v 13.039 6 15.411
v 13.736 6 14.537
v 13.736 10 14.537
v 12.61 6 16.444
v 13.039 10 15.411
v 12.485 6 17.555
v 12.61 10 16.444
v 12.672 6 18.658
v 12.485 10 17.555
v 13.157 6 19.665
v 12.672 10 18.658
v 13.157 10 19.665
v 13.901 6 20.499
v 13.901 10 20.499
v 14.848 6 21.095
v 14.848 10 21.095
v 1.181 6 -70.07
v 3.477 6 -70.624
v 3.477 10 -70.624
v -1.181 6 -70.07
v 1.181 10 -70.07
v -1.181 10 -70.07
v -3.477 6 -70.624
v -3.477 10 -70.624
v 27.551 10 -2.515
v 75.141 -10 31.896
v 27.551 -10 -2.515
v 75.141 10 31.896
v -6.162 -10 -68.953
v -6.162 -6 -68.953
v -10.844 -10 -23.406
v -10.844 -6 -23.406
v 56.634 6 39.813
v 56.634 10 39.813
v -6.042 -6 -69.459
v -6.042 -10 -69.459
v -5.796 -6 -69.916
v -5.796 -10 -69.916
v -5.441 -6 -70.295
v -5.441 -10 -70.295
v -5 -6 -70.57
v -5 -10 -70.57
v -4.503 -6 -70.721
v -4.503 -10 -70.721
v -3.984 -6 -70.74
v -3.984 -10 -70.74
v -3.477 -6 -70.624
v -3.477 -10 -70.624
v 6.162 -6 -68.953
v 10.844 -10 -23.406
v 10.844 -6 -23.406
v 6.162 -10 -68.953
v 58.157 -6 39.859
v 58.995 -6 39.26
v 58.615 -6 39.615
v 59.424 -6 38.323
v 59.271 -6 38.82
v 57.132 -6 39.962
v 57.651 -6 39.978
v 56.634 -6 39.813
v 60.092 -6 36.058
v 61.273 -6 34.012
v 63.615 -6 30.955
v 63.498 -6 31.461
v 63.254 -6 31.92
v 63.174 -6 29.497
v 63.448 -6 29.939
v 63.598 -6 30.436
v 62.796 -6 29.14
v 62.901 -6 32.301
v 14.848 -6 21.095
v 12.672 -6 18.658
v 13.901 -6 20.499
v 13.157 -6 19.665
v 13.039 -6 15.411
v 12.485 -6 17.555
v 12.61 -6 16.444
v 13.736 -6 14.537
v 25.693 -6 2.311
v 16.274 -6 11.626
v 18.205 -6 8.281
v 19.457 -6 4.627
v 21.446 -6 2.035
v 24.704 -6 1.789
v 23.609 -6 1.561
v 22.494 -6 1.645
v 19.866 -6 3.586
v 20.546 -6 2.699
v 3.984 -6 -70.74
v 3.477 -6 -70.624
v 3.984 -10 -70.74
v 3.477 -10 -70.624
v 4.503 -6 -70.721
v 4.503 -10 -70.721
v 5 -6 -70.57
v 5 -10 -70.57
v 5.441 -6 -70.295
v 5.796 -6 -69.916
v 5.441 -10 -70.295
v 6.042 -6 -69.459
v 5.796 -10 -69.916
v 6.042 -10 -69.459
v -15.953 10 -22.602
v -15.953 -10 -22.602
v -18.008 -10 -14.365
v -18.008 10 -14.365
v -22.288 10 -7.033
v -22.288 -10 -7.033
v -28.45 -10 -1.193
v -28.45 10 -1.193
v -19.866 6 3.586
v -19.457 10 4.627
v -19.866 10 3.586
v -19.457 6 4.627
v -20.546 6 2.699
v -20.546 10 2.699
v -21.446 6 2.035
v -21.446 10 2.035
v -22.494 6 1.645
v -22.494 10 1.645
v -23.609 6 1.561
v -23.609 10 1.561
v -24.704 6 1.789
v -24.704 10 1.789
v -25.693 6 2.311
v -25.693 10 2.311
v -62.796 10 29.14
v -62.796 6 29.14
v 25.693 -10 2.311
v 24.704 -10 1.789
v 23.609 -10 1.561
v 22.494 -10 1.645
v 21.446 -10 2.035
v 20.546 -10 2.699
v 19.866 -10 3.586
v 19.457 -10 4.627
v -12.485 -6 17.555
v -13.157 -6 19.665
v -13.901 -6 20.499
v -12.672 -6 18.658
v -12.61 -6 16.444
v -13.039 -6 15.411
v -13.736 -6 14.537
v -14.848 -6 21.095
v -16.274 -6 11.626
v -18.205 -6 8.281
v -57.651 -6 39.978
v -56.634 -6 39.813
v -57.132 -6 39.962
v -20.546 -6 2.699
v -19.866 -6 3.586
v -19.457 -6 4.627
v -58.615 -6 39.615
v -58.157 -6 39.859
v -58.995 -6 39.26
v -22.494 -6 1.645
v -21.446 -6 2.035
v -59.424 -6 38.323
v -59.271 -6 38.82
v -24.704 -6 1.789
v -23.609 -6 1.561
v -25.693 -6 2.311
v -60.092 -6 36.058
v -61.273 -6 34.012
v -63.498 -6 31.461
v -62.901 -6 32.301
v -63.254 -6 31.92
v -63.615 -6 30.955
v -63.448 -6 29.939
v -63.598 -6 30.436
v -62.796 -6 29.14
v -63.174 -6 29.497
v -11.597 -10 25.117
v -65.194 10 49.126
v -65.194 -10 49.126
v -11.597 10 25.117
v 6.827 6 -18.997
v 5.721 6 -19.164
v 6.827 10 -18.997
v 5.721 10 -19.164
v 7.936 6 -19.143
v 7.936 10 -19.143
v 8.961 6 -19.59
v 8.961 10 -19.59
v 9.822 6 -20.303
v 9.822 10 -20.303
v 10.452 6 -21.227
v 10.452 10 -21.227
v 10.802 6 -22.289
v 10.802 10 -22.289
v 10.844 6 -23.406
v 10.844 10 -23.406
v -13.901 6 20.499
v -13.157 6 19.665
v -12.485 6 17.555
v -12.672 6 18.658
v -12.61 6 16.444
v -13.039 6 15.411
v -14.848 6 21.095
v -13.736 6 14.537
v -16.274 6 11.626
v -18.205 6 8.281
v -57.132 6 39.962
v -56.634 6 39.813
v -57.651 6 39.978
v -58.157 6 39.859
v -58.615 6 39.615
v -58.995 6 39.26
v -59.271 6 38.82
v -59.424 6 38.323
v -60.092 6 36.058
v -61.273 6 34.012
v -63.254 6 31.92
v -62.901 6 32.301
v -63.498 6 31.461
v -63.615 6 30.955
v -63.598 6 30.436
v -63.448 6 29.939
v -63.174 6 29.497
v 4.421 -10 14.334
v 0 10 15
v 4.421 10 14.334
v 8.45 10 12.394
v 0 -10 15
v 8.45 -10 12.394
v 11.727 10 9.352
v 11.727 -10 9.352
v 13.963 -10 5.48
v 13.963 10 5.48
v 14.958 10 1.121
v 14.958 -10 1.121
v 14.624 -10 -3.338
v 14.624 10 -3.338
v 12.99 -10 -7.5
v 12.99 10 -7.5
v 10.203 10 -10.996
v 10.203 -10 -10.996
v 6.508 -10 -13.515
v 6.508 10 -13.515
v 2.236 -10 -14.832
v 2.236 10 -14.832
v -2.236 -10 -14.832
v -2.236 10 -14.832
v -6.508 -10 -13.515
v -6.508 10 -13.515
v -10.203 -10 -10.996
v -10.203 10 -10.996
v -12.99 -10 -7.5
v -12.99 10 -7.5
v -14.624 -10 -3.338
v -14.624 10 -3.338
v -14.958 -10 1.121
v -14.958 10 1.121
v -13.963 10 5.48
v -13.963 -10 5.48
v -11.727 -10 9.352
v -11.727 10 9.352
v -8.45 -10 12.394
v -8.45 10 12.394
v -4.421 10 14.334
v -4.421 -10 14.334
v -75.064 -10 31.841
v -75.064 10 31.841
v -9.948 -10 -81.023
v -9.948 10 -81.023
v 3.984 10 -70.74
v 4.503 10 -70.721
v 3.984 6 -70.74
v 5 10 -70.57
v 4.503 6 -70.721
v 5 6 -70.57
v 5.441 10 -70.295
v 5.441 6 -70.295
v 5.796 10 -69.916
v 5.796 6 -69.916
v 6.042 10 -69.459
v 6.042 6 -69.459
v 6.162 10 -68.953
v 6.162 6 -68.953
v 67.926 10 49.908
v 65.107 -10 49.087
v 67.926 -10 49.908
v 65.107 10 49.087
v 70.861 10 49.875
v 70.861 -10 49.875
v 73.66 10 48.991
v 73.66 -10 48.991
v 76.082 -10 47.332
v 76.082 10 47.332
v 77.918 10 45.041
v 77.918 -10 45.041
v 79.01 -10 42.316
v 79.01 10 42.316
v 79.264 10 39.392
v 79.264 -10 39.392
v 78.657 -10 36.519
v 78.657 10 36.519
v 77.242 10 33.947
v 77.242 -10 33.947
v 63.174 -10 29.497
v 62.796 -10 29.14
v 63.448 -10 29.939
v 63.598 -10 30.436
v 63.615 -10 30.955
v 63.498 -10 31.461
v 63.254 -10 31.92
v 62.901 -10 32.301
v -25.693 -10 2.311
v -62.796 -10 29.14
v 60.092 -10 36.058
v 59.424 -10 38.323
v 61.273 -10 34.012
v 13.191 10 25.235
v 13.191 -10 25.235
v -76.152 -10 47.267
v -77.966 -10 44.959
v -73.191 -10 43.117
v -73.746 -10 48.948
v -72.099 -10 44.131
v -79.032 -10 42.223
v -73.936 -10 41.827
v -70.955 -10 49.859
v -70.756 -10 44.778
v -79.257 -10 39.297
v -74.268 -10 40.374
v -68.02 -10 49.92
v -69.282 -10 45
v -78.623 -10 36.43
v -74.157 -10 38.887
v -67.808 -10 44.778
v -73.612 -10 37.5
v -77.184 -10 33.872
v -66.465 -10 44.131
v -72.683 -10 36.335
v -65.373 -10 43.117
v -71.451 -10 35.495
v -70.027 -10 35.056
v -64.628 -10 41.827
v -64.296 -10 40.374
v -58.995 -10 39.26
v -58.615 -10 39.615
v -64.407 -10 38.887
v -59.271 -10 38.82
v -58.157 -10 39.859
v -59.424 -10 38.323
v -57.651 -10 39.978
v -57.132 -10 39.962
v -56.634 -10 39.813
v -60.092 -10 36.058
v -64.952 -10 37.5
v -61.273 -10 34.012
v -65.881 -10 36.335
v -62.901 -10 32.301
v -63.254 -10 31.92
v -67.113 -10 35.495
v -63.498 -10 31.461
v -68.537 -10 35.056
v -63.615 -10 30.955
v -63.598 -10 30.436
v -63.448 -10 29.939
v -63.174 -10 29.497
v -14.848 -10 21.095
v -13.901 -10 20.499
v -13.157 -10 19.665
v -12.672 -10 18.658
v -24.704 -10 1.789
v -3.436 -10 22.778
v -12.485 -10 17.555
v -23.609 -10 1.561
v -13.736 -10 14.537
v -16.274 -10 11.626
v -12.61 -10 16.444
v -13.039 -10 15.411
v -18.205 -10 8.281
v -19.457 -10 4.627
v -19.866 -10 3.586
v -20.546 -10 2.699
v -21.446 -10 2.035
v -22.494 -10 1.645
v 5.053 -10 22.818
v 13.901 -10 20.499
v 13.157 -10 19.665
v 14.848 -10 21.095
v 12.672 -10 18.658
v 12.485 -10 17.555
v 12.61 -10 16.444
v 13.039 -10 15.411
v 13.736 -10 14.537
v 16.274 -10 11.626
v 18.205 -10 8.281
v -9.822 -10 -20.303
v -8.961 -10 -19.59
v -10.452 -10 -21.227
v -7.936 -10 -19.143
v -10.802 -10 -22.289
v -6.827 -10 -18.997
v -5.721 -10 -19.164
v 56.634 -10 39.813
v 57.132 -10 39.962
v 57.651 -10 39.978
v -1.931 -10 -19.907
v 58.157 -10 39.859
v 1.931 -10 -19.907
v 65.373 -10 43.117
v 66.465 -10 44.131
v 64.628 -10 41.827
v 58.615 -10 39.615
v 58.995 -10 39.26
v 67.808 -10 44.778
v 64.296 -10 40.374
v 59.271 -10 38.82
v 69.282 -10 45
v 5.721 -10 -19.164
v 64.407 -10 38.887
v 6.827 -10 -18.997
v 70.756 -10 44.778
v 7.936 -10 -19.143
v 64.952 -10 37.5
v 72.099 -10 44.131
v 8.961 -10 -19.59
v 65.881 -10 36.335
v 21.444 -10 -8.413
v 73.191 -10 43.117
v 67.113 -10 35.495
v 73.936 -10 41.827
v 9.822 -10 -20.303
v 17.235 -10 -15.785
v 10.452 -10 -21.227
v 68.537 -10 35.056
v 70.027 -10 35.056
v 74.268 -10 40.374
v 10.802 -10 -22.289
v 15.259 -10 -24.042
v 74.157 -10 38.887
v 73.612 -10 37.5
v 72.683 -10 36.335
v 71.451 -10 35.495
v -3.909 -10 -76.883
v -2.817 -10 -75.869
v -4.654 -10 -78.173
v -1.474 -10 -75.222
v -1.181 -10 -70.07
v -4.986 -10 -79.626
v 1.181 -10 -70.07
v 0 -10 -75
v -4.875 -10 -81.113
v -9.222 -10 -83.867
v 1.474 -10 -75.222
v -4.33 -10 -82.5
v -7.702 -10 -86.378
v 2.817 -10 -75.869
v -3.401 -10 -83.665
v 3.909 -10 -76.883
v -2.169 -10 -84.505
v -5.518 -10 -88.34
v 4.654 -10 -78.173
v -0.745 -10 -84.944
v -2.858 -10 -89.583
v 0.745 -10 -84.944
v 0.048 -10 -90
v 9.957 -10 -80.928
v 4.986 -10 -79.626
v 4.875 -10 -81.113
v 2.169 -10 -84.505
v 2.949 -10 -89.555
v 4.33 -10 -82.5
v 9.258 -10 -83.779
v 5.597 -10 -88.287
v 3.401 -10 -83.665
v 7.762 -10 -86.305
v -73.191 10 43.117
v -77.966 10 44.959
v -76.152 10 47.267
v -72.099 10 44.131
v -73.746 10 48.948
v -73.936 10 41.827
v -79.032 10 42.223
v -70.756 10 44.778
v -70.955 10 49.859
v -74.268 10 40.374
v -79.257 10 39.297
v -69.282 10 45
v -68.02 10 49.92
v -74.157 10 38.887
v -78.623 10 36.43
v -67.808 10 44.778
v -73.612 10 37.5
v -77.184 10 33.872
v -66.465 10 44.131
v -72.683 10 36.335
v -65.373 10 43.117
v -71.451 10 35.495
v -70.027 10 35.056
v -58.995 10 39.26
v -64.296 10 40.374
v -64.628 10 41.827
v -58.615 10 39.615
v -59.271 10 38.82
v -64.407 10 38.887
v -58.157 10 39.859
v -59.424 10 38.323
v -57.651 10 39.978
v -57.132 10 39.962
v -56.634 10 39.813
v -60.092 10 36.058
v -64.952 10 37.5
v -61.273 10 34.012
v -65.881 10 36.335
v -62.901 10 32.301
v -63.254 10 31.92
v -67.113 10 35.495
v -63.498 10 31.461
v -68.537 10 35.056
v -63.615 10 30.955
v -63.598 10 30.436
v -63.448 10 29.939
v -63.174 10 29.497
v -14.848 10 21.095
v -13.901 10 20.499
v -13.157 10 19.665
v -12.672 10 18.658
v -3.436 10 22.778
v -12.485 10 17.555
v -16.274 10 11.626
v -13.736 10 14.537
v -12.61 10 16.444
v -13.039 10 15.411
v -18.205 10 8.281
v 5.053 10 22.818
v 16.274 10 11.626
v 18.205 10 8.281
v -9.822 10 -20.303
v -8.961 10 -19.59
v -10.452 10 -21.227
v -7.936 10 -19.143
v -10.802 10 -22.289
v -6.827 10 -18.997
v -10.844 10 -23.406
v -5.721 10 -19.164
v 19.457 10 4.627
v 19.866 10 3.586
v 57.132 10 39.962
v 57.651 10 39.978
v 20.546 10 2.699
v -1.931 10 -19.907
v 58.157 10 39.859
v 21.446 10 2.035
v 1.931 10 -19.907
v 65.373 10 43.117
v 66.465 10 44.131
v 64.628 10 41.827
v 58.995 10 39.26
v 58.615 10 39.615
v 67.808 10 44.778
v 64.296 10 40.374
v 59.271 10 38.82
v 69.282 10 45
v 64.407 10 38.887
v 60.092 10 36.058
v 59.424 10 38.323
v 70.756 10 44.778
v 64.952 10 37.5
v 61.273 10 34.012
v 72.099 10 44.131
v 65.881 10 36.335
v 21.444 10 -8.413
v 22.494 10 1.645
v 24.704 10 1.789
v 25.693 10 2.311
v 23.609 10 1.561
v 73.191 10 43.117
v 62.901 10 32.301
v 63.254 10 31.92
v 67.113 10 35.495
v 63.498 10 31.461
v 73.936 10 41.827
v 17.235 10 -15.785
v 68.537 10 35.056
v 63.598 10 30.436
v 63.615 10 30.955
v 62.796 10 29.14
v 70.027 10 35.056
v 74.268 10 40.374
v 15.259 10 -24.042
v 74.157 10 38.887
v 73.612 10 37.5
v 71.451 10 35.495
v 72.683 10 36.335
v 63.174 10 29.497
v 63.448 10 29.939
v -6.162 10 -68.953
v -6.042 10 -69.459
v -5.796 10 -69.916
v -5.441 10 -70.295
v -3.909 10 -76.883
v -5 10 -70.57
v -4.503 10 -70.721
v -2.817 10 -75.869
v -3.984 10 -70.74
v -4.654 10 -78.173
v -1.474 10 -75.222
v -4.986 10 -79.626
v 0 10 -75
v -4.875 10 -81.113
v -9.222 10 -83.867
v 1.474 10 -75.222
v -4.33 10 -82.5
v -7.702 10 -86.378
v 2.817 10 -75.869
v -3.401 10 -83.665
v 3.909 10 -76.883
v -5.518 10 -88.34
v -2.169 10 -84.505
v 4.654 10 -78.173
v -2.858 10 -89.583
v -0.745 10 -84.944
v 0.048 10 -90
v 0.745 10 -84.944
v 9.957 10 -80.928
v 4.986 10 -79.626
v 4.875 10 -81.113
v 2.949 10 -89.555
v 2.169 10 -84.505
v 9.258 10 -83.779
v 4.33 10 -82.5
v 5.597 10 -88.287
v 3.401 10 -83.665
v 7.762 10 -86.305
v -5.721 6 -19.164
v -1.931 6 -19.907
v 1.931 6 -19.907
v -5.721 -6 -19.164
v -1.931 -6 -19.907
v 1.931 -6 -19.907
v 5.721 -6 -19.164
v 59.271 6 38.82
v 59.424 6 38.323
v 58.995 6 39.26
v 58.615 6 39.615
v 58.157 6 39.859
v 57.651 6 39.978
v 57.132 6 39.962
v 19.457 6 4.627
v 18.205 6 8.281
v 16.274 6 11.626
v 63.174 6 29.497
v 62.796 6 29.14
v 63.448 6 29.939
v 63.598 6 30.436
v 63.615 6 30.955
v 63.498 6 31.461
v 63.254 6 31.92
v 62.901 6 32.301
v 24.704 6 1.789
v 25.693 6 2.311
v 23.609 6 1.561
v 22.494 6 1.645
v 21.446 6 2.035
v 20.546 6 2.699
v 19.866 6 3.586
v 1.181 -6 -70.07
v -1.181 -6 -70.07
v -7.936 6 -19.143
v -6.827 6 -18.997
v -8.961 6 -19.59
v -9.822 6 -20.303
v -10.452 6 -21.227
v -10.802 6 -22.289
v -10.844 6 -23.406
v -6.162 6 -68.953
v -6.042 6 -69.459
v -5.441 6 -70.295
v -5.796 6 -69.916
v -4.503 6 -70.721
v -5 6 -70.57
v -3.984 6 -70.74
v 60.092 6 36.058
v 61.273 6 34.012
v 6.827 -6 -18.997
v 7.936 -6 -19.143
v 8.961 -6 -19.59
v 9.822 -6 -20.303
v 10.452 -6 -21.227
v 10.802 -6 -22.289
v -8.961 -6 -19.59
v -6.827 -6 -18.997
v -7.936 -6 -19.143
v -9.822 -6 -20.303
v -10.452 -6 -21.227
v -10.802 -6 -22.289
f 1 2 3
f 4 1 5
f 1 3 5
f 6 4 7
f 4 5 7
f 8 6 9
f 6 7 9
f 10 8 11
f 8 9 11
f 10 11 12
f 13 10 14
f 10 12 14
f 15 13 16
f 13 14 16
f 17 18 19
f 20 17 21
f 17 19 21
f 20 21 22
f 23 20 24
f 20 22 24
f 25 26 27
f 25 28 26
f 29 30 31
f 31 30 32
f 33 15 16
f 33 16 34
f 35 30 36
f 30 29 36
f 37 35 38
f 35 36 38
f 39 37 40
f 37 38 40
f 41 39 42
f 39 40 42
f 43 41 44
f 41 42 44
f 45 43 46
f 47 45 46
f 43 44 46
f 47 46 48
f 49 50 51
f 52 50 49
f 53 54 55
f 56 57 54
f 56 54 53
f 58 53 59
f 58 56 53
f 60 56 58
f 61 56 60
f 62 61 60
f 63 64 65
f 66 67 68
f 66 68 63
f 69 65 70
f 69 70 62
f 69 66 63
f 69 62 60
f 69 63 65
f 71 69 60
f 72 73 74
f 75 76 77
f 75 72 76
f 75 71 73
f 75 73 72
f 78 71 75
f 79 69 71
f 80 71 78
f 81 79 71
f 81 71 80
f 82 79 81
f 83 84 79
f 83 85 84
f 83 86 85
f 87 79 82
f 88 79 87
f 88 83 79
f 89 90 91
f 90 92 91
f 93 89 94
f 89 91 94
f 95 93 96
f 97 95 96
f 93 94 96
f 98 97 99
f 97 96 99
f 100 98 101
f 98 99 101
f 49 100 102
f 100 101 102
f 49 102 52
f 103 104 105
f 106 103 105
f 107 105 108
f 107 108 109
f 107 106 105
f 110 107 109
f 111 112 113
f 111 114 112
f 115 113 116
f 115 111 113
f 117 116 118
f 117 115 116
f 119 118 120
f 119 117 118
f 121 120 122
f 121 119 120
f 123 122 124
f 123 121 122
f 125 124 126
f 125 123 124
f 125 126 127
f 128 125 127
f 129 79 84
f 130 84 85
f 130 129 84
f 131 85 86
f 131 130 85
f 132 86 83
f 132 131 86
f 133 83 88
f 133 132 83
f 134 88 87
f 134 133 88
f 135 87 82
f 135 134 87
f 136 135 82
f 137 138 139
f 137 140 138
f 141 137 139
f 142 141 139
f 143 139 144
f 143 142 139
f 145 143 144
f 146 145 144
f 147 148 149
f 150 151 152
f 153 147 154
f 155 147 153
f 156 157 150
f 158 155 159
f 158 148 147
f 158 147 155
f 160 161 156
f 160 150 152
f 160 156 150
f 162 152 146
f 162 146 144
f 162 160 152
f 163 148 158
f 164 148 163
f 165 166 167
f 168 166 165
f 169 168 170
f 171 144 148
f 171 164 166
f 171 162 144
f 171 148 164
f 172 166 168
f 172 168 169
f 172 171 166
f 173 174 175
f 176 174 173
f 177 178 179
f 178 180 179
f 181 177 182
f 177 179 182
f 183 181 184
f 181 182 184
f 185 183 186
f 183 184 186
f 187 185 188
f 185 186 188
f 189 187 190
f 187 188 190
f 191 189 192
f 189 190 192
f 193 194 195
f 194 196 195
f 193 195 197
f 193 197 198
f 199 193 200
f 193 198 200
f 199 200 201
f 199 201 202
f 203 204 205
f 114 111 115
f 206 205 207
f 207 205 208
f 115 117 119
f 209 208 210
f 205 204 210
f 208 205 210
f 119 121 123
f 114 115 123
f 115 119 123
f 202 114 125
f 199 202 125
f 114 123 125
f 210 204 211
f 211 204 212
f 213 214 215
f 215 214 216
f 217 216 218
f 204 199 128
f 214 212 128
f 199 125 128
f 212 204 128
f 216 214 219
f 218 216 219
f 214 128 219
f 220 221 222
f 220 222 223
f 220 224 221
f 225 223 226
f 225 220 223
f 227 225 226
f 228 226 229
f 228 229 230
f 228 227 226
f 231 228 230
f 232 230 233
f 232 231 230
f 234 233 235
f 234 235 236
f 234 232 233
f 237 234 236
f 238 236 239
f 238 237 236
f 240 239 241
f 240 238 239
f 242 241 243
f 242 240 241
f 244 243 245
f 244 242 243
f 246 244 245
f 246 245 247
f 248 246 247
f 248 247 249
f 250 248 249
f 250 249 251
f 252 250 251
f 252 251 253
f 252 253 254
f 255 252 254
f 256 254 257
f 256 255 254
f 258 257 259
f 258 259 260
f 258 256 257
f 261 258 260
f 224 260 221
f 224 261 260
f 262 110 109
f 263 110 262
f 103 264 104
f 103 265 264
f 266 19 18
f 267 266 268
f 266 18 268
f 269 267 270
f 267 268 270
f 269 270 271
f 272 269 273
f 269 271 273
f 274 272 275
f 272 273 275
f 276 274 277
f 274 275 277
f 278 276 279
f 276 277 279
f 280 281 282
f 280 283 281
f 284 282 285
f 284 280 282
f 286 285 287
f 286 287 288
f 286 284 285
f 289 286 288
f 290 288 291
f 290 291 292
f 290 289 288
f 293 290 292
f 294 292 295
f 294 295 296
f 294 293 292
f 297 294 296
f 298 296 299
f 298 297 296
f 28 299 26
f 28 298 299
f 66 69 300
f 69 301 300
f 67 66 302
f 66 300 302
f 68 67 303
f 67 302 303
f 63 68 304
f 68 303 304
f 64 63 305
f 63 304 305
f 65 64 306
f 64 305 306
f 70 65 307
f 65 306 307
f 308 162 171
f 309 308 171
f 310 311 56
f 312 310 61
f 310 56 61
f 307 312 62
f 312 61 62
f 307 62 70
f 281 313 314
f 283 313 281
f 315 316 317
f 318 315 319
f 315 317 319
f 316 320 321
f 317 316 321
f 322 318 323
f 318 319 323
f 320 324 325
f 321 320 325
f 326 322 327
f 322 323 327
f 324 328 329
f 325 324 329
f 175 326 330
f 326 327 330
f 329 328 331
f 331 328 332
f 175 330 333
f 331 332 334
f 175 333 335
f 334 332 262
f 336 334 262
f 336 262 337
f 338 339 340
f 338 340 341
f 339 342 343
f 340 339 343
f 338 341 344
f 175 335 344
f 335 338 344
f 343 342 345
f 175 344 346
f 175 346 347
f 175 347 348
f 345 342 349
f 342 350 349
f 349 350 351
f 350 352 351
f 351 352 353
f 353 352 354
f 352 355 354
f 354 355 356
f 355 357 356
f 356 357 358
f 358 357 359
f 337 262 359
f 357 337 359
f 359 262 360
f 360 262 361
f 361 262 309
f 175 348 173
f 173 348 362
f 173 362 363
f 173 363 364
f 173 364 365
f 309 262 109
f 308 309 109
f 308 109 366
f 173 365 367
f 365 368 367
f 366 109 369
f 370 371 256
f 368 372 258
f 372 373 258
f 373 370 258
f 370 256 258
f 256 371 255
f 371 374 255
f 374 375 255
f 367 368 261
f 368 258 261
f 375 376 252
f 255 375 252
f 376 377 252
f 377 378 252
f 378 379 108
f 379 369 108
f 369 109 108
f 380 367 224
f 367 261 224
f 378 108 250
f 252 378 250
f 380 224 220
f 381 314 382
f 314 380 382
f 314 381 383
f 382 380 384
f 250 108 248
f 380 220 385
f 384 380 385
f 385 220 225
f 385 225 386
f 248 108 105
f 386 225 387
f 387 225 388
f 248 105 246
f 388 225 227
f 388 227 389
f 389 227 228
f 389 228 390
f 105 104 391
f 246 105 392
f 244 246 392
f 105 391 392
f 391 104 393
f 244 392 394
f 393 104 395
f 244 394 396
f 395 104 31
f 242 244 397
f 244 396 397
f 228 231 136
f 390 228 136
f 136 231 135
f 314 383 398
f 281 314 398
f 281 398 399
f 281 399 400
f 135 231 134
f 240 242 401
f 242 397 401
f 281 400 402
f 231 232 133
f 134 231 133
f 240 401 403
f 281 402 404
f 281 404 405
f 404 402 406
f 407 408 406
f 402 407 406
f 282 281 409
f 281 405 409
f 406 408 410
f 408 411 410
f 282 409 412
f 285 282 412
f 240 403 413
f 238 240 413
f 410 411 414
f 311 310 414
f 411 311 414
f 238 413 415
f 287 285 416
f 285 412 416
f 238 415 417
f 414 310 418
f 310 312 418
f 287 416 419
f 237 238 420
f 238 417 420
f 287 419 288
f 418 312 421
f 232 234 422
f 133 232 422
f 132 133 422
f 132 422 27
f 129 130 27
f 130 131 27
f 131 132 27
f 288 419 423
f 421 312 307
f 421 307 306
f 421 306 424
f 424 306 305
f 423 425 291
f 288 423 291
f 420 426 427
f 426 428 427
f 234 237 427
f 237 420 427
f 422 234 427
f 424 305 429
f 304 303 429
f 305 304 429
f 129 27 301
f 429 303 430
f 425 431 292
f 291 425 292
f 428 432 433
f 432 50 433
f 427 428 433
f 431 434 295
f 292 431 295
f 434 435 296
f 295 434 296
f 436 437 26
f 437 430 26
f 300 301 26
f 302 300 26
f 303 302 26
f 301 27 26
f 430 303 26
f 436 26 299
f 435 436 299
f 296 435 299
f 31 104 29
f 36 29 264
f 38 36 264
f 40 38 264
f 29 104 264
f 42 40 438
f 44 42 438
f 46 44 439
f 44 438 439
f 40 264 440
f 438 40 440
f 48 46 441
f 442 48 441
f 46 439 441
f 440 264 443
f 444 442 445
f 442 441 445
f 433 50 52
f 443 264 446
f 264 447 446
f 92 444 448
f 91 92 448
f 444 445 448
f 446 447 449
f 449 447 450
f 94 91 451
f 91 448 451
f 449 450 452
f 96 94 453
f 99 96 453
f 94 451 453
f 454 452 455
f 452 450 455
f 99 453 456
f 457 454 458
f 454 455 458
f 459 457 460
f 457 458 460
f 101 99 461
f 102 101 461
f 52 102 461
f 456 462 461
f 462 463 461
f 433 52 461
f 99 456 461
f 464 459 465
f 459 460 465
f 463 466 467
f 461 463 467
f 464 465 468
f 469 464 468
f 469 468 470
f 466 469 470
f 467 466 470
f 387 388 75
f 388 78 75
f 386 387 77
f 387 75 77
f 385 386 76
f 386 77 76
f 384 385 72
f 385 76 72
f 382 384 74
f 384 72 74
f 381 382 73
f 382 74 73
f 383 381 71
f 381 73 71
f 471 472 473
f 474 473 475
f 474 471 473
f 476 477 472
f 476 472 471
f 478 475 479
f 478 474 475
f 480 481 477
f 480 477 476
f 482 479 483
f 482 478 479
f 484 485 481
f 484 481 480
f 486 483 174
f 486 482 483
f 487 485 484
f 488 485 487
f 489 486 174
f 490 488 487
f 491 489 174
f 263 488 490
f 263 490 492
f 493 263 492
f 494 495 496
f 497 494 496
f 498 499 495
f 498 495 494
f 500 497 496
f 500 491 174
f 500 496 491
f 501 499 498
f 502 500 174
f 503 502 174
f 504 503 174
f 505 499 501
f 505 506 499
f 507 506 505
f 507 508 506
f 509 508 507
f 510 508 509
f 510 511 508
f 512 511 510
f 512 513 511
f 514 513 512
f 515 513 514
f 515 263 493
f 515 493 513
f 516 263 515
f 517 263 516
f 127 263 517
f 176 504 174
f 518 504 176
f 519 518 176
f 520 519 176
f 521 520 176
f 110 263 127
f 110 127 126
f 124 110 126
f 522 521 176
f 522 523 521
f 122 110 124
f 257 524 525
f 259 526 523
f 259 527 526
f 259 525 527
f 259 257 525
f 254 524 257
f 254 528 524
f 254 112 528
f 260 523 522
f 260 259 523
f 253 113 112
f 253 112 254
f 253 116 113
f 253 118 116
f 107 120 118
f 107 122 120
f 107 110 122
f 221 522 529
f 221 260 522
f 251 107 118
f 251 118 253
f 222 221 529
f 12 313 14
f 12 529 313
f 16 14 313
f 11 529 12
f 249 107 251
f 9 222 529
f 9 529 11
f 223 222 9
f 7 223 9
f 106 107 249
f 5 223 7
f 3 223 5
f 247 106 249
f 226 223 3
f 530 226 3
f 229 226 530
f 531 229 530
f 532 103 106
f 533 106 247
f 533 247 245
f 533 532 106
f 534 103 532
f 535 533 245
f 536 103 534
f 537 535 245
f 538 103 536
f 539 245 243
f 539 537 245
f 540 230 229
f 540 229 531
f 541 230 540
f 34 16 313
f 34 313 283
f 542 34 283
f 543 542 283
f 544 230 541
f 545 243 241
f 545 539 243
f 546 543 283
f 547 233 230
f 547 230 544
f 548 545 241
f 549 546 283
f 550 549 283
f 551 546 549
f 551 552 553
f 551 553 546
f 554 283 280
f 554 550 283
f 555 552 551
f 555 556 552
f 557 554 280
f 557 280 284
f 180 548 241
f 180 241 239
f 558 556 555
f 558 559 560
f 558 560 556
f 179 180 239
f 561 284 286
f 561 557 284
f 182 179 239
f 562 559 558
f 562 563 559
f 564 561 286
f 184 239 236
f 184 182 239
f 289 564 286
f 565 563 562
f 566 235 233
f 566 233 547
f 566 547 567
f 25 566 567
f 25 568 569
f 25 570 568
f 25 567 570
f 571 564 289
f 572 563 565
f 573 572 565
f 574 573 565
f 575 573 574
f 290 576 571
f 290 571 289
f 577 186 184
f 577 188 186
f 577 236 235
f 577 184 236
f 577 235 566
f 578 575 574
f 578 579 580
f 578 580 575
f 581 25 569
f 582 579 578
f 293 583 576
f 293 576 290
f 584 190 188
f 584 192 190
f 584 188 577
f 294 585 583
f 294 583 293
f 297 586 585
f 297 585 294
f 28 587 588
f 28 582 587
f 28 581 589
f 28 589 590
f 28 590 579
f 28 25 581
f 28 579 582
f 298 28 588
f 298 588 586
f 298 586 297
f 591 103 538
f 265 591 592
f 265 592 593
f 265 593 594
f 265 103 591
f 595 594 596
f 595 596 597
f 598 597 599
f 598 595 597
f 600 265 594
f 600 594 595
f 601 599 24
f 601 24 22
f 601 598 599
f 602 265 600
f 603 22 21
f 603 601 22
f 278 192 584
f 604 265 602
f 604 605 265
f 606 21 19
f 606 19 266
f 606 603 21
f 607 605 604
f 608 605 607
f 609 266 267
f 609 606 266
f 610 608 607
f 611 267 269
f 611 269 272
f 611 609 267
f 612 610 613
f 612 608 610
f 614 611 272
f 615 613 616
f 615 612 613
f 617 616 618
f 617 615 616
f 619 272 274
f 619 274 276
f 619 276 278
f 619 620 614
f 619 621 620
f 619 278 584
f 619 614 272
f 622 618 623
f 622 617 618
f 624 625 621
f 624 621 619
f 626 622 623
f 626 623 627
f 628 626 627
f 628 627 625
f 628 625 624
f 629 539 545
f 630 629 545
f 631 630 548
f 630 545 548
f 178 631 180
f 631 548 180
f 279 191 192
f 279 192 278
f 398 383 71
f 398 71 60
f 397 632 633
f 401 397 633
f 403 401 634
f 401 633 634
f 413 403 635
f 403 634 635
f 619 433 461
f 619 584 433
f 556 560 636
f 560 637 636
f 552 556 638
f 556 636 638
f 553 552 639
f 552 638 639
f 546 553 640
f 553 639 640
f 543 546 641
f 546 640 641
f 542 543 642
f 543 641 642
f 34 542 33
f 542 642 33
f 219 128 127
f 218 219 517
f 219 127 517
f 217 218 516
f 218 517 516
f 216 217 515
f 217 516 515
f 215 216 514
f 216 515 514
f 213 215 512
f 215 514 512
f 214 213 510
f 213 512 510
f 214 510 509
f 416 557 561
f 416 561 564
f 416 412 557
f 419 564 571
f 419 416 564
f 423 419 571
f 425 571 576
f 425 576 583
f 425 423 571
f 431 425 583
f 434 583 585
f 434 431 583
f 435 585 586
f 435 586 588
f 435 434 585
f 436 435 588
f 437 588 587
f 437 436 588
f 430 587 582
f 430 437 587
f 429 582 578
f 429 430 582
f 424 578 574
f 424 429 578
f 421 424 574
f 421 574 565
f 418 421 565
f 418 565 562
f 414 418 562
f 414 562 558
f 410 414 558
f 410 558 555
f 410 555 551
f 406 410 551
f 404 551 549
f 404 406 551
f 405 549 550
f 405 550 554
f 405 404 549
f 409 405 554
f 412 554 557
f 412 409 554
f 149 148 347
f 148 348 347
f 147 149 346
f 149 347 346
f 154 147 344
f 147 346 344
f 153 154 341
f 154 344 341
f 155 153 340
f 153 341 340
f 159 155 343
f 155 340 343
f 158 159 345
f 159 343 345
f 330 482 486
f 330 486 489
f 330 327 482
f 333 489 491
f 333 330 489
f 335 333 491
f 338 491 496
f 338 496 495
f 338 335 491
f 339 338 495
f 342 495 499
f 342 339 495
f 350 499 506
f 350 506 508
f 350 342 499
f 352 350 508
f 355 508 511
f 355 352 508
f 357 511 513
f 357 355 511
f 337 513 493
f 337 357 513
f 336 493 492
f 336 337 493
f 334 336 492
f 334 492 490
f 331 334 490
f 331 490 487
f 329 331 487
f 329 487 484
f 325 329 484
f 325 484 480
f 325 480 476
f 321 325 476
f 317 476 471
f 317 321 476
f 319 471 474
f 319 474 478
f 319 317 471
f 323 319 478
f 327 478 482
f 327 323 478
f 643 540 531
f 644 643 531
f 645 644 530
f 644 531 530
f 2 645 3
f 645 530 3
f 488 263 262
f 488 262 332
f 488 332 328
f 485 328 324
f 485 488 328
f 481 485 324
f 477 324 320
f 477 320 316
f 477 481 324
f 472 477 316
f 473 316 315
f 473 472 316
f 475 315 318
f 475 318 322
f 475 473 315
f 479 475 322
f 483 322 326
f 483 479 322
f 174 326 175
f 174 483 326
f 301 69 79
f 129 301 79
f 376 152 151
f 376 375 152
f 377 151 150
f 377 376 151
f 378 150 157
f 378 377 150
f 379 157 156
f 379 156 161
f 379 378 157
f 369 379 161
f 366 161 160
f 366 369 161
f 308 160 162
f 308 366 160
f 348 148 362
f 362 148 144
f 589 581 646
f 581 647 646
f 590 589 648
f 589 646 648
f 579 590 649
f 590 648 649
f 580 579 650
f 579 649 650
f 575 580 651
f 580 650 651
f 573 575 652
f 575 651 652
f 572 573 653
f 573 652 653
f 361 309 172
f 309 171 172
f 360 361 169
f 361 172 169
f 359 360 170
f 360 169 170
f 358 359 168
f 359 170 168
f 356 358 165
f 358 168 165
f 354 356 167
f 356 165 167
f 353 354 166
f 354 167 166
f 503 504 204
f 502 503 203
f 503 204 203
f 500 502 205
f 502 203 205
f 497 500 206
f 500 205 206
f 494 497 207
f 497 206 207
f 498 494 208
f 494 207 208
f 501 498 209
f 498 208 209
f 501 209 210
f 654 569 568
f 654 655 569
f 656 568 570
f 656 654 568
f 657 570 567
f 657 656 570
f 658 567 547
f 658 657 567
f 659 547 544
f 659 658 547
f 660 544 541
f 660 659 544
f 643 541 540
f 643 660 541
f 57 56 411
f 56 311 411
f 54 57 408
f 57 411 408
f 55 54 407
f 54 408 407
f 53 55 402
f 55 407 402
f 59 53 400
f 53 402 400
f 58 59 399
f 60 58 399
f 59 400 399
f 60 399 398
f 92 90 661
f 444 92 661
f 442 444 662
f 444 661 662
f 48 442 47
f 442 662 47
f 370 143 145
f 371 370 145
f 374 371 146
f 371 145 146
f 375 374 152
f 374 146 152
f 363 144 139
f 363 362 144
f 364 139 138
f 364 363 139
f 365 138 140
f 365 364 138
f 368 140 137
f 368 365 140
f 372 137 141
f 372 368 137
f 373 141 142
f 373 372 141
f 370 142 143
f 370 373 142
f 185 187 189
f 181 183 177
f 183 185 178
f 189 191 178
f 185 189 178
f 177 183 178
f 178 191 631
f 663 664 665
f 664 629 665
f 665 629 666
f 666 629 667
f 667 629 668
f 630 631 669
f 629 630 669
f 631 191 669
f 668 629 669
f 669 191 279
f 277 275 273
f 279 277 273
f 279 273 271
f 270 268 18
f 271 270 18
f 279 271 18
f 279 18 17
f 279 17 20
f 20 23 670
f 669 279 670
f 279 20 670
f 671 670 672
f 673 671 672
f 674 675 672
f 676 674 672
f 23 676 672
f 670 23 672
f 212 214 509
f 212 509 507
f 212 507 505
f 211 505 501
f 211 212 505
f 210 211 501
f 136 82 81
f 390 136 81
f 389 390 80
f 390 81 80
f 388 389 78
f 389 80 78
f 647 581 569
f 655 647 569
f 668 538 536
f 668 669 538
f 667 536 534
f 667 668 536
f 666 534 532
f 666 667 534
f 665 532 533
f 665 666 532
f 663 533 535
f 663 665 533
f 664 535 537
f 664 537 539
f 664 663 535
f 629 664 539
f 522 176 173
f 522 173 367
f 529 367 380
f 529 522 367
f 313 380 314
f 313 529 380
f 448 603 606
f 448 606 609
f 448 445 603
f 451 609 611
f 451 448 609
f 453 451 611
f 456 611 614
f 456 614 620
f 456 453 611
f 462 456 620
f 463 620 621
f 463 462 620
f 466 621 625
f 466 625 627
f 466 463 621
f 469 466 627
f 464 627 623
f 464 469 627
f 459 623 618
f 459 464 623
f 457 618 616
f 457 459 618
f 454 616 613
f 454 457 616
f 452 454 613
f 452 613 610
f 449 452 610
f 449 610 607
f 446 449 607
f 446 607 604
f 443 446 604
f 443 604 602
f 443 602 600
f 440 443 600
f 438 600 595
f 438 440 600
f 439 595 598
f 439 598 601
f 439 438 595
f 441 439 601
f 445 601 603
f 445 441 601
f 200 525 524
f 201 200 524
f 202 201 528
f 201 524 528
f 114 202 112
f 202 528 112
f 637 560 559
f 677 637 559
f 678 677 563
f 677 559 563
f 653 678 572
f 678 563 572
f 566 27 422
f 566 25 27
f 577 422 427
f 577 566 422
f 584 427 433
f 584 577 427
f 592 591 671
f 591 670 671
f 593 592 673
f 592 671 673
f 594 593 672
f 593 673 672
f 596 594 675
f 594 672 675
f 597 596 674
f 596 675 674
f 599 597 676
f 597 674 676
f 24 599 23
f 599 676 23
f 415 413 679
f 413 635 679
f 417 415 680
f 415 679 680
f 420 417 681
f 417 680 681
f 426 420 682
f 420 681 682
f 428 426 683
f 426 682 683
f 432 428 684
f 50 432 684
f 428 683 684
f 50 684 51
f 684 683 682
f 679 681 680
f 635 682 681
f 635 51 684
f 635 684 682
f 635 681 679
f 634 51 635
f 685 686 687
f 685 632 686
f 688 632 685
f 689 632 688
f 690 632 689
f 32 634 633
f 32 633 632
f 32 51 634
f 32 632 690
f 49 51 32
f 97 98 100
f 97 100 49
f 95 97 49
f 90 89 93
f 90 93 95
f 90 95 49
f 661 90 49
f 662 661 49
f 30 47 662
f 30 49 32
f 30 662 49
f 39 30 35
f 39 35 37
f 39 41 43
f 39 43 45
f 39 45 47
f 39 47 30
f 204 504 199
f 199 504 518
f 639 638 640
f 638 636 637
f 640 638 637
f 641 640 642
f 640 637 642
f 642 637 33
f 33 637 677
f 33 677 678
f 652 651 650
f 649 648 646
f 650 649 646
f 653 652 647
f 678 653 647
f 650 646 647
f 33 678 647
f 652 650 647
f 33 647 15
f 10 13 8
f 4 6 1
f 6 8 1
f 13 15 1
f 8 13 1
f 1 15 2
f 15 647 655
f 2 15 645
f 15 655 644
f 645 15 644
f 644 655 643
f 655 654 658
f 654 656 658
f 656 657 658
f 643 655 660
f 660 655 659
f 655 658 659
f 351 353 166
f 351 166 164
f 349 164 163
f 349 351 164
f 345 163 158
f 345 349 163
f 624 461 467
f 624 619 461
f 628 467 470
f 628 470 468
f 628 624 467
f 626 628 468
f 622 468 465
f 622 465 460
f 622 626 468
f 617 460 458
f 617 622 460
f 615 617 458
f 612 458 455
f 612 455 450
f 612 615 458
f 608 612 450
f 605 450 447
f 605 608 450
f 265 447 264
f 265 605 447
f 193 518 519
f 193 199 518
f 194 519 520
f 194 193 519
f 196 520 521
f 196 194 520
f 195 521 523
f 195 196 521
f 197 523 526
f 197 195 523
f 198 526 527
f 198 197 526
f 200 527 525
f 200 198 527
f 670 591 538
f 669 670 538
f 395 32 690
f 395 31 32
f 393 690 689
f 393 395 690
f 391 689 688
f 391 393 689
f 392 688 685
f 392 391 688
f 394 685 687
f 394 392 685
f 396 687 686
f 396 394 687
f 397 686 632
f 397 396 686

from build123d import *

# Parameters (mm, degrees)
SCHIZZO1_R                   = 15
SCHIZZO1_R_2                 = 5
ESTRUSIONE_ESTRUSIONE3_DEPTH = 10
ESTRUSIONE_ESTRUSIONE4_DEPTH = 6
RACCORDO1_R                  = 2
RACCORDO2_R                  = 4


with BuildPart() as part:
    # Schizzo1 → Estrusione-Estrusione3 (new, symmetric)
    with BuildSketch(Plane(origin=(0, 0, 0), x_dir=(1, 0, 0), z_dir=(0, 1, 0))):
        with BuildLine():
            Line((-9.947570822, 81.022660617), (-15.953490717, 22.602190996))
            ThreePointArc((-15.953490717, 22.602190996), (-19.887097519, 10.546739253), (-28.450004541, 1.193461616))
            Line((-28.450004541, 1.193461616), (-75.064098517, -31.841096257))
            ThreePointArc((-75.064098517, -31.841096257), (-77.965975808, -44.958742299), (-65.193896965, -49.126179346))
            Line((-65.193896965, -49.126179346), (-11.597326225, -25.117223738))
            ThreePointArc((-11.597326225, -25.117223738), (0.80980464, -22.496101285), (13.191434192, -25.235157478))
            Line((13.191434192, -25.235157478), (65.107247501, -49.0868681))
            ThreePointArc((65.107247501, -49.0868681), (77.918400858, -45.041144531), (75.141467788, -31.896481271))
            Line((75.141467788, -31.896481271), (27.550816942, 2.515032742))
            ThreePointArc((27.550816942, 2.515032742), (19.077292879, 11.949362033), (15.258570349, 24.041695862))
            Line((15.258570349, 24.041695862), (9.956851016, 80.927964356))
            ThreePointArc((9.956851016, 80.927964356), (0.047574951, 89.999886831), (-9.947570822, 81.022660617))
        make_face()
        Circle(SCHIZZO1_R, mode=Mode.SUBTRACT)
        with Locations((0, 80)):
            Circle(SCHIZZO1_R_2, mode=Mode.SUBTRACT)
        with Locations((69.282032303, -40)):
            Circle(SCHIZZO1_R_2, mode=Mode.SUBTRACT)
        with Locations((-69.282032303, -40)):
            Circle(SCHIZZO1_R_2, mode=Mode.SUBTRACT)
        with BuildLine():
            Line((-5.859435485, 71.896481271), (-11.573917762, 16.31086839))
            ThreePointArc((-11.573917762, 16.31086839), (0, 20), (11.573917762, 16.31086839))
            Line((11.573917762, 16.31086839), (5.859435485, 71.896481271))
            ThreePointArc((5.859435485, 71.896481271), (0, 70), (-5.859435485, 71.896481271))
        make_face(mode=Mode.SUBTRACT)
        with BuildLine():
            Line((65.193896965, -30.873820654), (19.912585265, 1.867872608))
            ThreePointArc((19.912585265, 1.867872608), (17.320508076, -10), (8.338667503, -18.178740998))
            Line((8.338667503, -18.178740998), (59.334461481, -41.022660617))
            ThreePointArc((59.334461481, -41.022660617), (60.621778265, -35), (65.193896965, -30.873820654))
        make_face(mode=Mode.SUBTRACT)
        with BuildLine():
            Line((-59.334461481, -41.022660617), (-8.338667503, -18.178740998))
            ThreePointArc((-8.338667503, -18.178740998), (-17.320508076, -10), (-19.912585265, 1.867872608))
            Line((-19.912585265, 1.867872608), (-65.193896965, -30.873820654))
            ThreePointArc((-65.193896965, -30.873820654), (-60.621778265, -35), (-59.334461481, -41.022660617))
        make_face(mode=Mode.SUBTRACT)
    extrude(amount=ESTRUSIONE_ESTRUSIONE3_DEPTH, both=True)

    # Schizzo1<2> → Estrusione-Estrusione4 (add, symmetric)
    with BuildSketch(Plane(origin=(0, 0, 0), x_dir=(1, 0, 0), z_dir=(0, 1, 0))):
        with BuildLine():
            ThreePointArc((5.859435485, 71.896481271), (0, 70), (-5.859435485, 71.896481271))
            Line((-5.859435485, 71.896481271), (-11.573917762, 16.31086839))
            ThreePointArc((-11.573917762, 16.31086839), (0, 20), (11.573917762, 16.31086839))
            Line((11.573917762, 16.31086839), (5.859435485, 71.896481271))
        make_face()
        with BuildLine():
            ThreePointArc((59.334461481, -41.022660617), (60.621778265, -35), (65.193896965, -30.873820654))
            Line((65.193896965, -30.873820654), (19.912585265, 1.867872608))
            ThreePointArc((19.912585265, 1.867872608), (17.320508076, -10), (8.338667503, -18.178740998))
            Line((8.338667503, -18.178740998), (59.334461481, -41.022660617))
        make_face()
        with BuildLine():
            ThreePointArc((-65.193896965, -30.873820654), (-60.621778265, -35), (-59.334461481, -41.022660617))
            Line((-59.334461481, -41.022660617), (-8.338667503, -18.178740998))
            ThreePointArc((-8.338667503, -18.178740998), (-17.320508076, -10), (-19.912585265, 1.867872608))
            Line((-19.912585265, 1.867872608), (-65.193896965, -30.873820654))
        make_face()
    extrude(amount=ESTRUSIONE_ESTRUSIONE4_DEPTH, both=True)

    # Raccordo1
    raccordo1_edges = [part.edges().sort_by_distance(p)[0] for p in [
        (-59.334461481, -8, 41.022660617),
        (-65.193896965, -8, 30.873820654),
        (-59.334461481, 8, 41.022660617),
        (-65.193896965, 8, 30.873820654),
        (65.193896965, 8, 30.873820654),
        (59.334461481, 8, 41.022660617),
        (59.334461481, -8, 41.022660617),
        (65.193896965, -8, 30.873820654),
        (-5.859435485, -8, -71.896481271),
        (-5.859435485, 8, -71.896481271),
        (5.859435485, 8, -71.896481271),
        (5.859435485, -8, -71.896481271),
    ]]
    fillet(raccordo1_edges, radius=RACCORDO1_R)

    # Raccordo2
    raccordo2_edges = [part.edges().sort_by_distance(p)[0] for p in [
        (-19.912585265, -8, -1.867872608),
        (-11.573917762, -8, -16.31086839),
        (11.573917762, -8, -16.31086839),
        (-8.338667503, -8, 18.178740998),
        (19.912585265, -8, -1.867872608),
        (8.338667503, -8, 18.178740998),
        (-11.573917762, 8, -16.31086839),
        (-8.338667503, 8, 18.178740998),
        (-19.912585265, 8, -1.867872608),
        (8.338667503, 8, 18.178740998),
        (19.912585265, 8, -1.867872608),
        (11.573917762, 8, -16.31086839),
    ]]
    fillet(raccordo2_edges, radius=RACCORDO2_R)


solid = part.part
